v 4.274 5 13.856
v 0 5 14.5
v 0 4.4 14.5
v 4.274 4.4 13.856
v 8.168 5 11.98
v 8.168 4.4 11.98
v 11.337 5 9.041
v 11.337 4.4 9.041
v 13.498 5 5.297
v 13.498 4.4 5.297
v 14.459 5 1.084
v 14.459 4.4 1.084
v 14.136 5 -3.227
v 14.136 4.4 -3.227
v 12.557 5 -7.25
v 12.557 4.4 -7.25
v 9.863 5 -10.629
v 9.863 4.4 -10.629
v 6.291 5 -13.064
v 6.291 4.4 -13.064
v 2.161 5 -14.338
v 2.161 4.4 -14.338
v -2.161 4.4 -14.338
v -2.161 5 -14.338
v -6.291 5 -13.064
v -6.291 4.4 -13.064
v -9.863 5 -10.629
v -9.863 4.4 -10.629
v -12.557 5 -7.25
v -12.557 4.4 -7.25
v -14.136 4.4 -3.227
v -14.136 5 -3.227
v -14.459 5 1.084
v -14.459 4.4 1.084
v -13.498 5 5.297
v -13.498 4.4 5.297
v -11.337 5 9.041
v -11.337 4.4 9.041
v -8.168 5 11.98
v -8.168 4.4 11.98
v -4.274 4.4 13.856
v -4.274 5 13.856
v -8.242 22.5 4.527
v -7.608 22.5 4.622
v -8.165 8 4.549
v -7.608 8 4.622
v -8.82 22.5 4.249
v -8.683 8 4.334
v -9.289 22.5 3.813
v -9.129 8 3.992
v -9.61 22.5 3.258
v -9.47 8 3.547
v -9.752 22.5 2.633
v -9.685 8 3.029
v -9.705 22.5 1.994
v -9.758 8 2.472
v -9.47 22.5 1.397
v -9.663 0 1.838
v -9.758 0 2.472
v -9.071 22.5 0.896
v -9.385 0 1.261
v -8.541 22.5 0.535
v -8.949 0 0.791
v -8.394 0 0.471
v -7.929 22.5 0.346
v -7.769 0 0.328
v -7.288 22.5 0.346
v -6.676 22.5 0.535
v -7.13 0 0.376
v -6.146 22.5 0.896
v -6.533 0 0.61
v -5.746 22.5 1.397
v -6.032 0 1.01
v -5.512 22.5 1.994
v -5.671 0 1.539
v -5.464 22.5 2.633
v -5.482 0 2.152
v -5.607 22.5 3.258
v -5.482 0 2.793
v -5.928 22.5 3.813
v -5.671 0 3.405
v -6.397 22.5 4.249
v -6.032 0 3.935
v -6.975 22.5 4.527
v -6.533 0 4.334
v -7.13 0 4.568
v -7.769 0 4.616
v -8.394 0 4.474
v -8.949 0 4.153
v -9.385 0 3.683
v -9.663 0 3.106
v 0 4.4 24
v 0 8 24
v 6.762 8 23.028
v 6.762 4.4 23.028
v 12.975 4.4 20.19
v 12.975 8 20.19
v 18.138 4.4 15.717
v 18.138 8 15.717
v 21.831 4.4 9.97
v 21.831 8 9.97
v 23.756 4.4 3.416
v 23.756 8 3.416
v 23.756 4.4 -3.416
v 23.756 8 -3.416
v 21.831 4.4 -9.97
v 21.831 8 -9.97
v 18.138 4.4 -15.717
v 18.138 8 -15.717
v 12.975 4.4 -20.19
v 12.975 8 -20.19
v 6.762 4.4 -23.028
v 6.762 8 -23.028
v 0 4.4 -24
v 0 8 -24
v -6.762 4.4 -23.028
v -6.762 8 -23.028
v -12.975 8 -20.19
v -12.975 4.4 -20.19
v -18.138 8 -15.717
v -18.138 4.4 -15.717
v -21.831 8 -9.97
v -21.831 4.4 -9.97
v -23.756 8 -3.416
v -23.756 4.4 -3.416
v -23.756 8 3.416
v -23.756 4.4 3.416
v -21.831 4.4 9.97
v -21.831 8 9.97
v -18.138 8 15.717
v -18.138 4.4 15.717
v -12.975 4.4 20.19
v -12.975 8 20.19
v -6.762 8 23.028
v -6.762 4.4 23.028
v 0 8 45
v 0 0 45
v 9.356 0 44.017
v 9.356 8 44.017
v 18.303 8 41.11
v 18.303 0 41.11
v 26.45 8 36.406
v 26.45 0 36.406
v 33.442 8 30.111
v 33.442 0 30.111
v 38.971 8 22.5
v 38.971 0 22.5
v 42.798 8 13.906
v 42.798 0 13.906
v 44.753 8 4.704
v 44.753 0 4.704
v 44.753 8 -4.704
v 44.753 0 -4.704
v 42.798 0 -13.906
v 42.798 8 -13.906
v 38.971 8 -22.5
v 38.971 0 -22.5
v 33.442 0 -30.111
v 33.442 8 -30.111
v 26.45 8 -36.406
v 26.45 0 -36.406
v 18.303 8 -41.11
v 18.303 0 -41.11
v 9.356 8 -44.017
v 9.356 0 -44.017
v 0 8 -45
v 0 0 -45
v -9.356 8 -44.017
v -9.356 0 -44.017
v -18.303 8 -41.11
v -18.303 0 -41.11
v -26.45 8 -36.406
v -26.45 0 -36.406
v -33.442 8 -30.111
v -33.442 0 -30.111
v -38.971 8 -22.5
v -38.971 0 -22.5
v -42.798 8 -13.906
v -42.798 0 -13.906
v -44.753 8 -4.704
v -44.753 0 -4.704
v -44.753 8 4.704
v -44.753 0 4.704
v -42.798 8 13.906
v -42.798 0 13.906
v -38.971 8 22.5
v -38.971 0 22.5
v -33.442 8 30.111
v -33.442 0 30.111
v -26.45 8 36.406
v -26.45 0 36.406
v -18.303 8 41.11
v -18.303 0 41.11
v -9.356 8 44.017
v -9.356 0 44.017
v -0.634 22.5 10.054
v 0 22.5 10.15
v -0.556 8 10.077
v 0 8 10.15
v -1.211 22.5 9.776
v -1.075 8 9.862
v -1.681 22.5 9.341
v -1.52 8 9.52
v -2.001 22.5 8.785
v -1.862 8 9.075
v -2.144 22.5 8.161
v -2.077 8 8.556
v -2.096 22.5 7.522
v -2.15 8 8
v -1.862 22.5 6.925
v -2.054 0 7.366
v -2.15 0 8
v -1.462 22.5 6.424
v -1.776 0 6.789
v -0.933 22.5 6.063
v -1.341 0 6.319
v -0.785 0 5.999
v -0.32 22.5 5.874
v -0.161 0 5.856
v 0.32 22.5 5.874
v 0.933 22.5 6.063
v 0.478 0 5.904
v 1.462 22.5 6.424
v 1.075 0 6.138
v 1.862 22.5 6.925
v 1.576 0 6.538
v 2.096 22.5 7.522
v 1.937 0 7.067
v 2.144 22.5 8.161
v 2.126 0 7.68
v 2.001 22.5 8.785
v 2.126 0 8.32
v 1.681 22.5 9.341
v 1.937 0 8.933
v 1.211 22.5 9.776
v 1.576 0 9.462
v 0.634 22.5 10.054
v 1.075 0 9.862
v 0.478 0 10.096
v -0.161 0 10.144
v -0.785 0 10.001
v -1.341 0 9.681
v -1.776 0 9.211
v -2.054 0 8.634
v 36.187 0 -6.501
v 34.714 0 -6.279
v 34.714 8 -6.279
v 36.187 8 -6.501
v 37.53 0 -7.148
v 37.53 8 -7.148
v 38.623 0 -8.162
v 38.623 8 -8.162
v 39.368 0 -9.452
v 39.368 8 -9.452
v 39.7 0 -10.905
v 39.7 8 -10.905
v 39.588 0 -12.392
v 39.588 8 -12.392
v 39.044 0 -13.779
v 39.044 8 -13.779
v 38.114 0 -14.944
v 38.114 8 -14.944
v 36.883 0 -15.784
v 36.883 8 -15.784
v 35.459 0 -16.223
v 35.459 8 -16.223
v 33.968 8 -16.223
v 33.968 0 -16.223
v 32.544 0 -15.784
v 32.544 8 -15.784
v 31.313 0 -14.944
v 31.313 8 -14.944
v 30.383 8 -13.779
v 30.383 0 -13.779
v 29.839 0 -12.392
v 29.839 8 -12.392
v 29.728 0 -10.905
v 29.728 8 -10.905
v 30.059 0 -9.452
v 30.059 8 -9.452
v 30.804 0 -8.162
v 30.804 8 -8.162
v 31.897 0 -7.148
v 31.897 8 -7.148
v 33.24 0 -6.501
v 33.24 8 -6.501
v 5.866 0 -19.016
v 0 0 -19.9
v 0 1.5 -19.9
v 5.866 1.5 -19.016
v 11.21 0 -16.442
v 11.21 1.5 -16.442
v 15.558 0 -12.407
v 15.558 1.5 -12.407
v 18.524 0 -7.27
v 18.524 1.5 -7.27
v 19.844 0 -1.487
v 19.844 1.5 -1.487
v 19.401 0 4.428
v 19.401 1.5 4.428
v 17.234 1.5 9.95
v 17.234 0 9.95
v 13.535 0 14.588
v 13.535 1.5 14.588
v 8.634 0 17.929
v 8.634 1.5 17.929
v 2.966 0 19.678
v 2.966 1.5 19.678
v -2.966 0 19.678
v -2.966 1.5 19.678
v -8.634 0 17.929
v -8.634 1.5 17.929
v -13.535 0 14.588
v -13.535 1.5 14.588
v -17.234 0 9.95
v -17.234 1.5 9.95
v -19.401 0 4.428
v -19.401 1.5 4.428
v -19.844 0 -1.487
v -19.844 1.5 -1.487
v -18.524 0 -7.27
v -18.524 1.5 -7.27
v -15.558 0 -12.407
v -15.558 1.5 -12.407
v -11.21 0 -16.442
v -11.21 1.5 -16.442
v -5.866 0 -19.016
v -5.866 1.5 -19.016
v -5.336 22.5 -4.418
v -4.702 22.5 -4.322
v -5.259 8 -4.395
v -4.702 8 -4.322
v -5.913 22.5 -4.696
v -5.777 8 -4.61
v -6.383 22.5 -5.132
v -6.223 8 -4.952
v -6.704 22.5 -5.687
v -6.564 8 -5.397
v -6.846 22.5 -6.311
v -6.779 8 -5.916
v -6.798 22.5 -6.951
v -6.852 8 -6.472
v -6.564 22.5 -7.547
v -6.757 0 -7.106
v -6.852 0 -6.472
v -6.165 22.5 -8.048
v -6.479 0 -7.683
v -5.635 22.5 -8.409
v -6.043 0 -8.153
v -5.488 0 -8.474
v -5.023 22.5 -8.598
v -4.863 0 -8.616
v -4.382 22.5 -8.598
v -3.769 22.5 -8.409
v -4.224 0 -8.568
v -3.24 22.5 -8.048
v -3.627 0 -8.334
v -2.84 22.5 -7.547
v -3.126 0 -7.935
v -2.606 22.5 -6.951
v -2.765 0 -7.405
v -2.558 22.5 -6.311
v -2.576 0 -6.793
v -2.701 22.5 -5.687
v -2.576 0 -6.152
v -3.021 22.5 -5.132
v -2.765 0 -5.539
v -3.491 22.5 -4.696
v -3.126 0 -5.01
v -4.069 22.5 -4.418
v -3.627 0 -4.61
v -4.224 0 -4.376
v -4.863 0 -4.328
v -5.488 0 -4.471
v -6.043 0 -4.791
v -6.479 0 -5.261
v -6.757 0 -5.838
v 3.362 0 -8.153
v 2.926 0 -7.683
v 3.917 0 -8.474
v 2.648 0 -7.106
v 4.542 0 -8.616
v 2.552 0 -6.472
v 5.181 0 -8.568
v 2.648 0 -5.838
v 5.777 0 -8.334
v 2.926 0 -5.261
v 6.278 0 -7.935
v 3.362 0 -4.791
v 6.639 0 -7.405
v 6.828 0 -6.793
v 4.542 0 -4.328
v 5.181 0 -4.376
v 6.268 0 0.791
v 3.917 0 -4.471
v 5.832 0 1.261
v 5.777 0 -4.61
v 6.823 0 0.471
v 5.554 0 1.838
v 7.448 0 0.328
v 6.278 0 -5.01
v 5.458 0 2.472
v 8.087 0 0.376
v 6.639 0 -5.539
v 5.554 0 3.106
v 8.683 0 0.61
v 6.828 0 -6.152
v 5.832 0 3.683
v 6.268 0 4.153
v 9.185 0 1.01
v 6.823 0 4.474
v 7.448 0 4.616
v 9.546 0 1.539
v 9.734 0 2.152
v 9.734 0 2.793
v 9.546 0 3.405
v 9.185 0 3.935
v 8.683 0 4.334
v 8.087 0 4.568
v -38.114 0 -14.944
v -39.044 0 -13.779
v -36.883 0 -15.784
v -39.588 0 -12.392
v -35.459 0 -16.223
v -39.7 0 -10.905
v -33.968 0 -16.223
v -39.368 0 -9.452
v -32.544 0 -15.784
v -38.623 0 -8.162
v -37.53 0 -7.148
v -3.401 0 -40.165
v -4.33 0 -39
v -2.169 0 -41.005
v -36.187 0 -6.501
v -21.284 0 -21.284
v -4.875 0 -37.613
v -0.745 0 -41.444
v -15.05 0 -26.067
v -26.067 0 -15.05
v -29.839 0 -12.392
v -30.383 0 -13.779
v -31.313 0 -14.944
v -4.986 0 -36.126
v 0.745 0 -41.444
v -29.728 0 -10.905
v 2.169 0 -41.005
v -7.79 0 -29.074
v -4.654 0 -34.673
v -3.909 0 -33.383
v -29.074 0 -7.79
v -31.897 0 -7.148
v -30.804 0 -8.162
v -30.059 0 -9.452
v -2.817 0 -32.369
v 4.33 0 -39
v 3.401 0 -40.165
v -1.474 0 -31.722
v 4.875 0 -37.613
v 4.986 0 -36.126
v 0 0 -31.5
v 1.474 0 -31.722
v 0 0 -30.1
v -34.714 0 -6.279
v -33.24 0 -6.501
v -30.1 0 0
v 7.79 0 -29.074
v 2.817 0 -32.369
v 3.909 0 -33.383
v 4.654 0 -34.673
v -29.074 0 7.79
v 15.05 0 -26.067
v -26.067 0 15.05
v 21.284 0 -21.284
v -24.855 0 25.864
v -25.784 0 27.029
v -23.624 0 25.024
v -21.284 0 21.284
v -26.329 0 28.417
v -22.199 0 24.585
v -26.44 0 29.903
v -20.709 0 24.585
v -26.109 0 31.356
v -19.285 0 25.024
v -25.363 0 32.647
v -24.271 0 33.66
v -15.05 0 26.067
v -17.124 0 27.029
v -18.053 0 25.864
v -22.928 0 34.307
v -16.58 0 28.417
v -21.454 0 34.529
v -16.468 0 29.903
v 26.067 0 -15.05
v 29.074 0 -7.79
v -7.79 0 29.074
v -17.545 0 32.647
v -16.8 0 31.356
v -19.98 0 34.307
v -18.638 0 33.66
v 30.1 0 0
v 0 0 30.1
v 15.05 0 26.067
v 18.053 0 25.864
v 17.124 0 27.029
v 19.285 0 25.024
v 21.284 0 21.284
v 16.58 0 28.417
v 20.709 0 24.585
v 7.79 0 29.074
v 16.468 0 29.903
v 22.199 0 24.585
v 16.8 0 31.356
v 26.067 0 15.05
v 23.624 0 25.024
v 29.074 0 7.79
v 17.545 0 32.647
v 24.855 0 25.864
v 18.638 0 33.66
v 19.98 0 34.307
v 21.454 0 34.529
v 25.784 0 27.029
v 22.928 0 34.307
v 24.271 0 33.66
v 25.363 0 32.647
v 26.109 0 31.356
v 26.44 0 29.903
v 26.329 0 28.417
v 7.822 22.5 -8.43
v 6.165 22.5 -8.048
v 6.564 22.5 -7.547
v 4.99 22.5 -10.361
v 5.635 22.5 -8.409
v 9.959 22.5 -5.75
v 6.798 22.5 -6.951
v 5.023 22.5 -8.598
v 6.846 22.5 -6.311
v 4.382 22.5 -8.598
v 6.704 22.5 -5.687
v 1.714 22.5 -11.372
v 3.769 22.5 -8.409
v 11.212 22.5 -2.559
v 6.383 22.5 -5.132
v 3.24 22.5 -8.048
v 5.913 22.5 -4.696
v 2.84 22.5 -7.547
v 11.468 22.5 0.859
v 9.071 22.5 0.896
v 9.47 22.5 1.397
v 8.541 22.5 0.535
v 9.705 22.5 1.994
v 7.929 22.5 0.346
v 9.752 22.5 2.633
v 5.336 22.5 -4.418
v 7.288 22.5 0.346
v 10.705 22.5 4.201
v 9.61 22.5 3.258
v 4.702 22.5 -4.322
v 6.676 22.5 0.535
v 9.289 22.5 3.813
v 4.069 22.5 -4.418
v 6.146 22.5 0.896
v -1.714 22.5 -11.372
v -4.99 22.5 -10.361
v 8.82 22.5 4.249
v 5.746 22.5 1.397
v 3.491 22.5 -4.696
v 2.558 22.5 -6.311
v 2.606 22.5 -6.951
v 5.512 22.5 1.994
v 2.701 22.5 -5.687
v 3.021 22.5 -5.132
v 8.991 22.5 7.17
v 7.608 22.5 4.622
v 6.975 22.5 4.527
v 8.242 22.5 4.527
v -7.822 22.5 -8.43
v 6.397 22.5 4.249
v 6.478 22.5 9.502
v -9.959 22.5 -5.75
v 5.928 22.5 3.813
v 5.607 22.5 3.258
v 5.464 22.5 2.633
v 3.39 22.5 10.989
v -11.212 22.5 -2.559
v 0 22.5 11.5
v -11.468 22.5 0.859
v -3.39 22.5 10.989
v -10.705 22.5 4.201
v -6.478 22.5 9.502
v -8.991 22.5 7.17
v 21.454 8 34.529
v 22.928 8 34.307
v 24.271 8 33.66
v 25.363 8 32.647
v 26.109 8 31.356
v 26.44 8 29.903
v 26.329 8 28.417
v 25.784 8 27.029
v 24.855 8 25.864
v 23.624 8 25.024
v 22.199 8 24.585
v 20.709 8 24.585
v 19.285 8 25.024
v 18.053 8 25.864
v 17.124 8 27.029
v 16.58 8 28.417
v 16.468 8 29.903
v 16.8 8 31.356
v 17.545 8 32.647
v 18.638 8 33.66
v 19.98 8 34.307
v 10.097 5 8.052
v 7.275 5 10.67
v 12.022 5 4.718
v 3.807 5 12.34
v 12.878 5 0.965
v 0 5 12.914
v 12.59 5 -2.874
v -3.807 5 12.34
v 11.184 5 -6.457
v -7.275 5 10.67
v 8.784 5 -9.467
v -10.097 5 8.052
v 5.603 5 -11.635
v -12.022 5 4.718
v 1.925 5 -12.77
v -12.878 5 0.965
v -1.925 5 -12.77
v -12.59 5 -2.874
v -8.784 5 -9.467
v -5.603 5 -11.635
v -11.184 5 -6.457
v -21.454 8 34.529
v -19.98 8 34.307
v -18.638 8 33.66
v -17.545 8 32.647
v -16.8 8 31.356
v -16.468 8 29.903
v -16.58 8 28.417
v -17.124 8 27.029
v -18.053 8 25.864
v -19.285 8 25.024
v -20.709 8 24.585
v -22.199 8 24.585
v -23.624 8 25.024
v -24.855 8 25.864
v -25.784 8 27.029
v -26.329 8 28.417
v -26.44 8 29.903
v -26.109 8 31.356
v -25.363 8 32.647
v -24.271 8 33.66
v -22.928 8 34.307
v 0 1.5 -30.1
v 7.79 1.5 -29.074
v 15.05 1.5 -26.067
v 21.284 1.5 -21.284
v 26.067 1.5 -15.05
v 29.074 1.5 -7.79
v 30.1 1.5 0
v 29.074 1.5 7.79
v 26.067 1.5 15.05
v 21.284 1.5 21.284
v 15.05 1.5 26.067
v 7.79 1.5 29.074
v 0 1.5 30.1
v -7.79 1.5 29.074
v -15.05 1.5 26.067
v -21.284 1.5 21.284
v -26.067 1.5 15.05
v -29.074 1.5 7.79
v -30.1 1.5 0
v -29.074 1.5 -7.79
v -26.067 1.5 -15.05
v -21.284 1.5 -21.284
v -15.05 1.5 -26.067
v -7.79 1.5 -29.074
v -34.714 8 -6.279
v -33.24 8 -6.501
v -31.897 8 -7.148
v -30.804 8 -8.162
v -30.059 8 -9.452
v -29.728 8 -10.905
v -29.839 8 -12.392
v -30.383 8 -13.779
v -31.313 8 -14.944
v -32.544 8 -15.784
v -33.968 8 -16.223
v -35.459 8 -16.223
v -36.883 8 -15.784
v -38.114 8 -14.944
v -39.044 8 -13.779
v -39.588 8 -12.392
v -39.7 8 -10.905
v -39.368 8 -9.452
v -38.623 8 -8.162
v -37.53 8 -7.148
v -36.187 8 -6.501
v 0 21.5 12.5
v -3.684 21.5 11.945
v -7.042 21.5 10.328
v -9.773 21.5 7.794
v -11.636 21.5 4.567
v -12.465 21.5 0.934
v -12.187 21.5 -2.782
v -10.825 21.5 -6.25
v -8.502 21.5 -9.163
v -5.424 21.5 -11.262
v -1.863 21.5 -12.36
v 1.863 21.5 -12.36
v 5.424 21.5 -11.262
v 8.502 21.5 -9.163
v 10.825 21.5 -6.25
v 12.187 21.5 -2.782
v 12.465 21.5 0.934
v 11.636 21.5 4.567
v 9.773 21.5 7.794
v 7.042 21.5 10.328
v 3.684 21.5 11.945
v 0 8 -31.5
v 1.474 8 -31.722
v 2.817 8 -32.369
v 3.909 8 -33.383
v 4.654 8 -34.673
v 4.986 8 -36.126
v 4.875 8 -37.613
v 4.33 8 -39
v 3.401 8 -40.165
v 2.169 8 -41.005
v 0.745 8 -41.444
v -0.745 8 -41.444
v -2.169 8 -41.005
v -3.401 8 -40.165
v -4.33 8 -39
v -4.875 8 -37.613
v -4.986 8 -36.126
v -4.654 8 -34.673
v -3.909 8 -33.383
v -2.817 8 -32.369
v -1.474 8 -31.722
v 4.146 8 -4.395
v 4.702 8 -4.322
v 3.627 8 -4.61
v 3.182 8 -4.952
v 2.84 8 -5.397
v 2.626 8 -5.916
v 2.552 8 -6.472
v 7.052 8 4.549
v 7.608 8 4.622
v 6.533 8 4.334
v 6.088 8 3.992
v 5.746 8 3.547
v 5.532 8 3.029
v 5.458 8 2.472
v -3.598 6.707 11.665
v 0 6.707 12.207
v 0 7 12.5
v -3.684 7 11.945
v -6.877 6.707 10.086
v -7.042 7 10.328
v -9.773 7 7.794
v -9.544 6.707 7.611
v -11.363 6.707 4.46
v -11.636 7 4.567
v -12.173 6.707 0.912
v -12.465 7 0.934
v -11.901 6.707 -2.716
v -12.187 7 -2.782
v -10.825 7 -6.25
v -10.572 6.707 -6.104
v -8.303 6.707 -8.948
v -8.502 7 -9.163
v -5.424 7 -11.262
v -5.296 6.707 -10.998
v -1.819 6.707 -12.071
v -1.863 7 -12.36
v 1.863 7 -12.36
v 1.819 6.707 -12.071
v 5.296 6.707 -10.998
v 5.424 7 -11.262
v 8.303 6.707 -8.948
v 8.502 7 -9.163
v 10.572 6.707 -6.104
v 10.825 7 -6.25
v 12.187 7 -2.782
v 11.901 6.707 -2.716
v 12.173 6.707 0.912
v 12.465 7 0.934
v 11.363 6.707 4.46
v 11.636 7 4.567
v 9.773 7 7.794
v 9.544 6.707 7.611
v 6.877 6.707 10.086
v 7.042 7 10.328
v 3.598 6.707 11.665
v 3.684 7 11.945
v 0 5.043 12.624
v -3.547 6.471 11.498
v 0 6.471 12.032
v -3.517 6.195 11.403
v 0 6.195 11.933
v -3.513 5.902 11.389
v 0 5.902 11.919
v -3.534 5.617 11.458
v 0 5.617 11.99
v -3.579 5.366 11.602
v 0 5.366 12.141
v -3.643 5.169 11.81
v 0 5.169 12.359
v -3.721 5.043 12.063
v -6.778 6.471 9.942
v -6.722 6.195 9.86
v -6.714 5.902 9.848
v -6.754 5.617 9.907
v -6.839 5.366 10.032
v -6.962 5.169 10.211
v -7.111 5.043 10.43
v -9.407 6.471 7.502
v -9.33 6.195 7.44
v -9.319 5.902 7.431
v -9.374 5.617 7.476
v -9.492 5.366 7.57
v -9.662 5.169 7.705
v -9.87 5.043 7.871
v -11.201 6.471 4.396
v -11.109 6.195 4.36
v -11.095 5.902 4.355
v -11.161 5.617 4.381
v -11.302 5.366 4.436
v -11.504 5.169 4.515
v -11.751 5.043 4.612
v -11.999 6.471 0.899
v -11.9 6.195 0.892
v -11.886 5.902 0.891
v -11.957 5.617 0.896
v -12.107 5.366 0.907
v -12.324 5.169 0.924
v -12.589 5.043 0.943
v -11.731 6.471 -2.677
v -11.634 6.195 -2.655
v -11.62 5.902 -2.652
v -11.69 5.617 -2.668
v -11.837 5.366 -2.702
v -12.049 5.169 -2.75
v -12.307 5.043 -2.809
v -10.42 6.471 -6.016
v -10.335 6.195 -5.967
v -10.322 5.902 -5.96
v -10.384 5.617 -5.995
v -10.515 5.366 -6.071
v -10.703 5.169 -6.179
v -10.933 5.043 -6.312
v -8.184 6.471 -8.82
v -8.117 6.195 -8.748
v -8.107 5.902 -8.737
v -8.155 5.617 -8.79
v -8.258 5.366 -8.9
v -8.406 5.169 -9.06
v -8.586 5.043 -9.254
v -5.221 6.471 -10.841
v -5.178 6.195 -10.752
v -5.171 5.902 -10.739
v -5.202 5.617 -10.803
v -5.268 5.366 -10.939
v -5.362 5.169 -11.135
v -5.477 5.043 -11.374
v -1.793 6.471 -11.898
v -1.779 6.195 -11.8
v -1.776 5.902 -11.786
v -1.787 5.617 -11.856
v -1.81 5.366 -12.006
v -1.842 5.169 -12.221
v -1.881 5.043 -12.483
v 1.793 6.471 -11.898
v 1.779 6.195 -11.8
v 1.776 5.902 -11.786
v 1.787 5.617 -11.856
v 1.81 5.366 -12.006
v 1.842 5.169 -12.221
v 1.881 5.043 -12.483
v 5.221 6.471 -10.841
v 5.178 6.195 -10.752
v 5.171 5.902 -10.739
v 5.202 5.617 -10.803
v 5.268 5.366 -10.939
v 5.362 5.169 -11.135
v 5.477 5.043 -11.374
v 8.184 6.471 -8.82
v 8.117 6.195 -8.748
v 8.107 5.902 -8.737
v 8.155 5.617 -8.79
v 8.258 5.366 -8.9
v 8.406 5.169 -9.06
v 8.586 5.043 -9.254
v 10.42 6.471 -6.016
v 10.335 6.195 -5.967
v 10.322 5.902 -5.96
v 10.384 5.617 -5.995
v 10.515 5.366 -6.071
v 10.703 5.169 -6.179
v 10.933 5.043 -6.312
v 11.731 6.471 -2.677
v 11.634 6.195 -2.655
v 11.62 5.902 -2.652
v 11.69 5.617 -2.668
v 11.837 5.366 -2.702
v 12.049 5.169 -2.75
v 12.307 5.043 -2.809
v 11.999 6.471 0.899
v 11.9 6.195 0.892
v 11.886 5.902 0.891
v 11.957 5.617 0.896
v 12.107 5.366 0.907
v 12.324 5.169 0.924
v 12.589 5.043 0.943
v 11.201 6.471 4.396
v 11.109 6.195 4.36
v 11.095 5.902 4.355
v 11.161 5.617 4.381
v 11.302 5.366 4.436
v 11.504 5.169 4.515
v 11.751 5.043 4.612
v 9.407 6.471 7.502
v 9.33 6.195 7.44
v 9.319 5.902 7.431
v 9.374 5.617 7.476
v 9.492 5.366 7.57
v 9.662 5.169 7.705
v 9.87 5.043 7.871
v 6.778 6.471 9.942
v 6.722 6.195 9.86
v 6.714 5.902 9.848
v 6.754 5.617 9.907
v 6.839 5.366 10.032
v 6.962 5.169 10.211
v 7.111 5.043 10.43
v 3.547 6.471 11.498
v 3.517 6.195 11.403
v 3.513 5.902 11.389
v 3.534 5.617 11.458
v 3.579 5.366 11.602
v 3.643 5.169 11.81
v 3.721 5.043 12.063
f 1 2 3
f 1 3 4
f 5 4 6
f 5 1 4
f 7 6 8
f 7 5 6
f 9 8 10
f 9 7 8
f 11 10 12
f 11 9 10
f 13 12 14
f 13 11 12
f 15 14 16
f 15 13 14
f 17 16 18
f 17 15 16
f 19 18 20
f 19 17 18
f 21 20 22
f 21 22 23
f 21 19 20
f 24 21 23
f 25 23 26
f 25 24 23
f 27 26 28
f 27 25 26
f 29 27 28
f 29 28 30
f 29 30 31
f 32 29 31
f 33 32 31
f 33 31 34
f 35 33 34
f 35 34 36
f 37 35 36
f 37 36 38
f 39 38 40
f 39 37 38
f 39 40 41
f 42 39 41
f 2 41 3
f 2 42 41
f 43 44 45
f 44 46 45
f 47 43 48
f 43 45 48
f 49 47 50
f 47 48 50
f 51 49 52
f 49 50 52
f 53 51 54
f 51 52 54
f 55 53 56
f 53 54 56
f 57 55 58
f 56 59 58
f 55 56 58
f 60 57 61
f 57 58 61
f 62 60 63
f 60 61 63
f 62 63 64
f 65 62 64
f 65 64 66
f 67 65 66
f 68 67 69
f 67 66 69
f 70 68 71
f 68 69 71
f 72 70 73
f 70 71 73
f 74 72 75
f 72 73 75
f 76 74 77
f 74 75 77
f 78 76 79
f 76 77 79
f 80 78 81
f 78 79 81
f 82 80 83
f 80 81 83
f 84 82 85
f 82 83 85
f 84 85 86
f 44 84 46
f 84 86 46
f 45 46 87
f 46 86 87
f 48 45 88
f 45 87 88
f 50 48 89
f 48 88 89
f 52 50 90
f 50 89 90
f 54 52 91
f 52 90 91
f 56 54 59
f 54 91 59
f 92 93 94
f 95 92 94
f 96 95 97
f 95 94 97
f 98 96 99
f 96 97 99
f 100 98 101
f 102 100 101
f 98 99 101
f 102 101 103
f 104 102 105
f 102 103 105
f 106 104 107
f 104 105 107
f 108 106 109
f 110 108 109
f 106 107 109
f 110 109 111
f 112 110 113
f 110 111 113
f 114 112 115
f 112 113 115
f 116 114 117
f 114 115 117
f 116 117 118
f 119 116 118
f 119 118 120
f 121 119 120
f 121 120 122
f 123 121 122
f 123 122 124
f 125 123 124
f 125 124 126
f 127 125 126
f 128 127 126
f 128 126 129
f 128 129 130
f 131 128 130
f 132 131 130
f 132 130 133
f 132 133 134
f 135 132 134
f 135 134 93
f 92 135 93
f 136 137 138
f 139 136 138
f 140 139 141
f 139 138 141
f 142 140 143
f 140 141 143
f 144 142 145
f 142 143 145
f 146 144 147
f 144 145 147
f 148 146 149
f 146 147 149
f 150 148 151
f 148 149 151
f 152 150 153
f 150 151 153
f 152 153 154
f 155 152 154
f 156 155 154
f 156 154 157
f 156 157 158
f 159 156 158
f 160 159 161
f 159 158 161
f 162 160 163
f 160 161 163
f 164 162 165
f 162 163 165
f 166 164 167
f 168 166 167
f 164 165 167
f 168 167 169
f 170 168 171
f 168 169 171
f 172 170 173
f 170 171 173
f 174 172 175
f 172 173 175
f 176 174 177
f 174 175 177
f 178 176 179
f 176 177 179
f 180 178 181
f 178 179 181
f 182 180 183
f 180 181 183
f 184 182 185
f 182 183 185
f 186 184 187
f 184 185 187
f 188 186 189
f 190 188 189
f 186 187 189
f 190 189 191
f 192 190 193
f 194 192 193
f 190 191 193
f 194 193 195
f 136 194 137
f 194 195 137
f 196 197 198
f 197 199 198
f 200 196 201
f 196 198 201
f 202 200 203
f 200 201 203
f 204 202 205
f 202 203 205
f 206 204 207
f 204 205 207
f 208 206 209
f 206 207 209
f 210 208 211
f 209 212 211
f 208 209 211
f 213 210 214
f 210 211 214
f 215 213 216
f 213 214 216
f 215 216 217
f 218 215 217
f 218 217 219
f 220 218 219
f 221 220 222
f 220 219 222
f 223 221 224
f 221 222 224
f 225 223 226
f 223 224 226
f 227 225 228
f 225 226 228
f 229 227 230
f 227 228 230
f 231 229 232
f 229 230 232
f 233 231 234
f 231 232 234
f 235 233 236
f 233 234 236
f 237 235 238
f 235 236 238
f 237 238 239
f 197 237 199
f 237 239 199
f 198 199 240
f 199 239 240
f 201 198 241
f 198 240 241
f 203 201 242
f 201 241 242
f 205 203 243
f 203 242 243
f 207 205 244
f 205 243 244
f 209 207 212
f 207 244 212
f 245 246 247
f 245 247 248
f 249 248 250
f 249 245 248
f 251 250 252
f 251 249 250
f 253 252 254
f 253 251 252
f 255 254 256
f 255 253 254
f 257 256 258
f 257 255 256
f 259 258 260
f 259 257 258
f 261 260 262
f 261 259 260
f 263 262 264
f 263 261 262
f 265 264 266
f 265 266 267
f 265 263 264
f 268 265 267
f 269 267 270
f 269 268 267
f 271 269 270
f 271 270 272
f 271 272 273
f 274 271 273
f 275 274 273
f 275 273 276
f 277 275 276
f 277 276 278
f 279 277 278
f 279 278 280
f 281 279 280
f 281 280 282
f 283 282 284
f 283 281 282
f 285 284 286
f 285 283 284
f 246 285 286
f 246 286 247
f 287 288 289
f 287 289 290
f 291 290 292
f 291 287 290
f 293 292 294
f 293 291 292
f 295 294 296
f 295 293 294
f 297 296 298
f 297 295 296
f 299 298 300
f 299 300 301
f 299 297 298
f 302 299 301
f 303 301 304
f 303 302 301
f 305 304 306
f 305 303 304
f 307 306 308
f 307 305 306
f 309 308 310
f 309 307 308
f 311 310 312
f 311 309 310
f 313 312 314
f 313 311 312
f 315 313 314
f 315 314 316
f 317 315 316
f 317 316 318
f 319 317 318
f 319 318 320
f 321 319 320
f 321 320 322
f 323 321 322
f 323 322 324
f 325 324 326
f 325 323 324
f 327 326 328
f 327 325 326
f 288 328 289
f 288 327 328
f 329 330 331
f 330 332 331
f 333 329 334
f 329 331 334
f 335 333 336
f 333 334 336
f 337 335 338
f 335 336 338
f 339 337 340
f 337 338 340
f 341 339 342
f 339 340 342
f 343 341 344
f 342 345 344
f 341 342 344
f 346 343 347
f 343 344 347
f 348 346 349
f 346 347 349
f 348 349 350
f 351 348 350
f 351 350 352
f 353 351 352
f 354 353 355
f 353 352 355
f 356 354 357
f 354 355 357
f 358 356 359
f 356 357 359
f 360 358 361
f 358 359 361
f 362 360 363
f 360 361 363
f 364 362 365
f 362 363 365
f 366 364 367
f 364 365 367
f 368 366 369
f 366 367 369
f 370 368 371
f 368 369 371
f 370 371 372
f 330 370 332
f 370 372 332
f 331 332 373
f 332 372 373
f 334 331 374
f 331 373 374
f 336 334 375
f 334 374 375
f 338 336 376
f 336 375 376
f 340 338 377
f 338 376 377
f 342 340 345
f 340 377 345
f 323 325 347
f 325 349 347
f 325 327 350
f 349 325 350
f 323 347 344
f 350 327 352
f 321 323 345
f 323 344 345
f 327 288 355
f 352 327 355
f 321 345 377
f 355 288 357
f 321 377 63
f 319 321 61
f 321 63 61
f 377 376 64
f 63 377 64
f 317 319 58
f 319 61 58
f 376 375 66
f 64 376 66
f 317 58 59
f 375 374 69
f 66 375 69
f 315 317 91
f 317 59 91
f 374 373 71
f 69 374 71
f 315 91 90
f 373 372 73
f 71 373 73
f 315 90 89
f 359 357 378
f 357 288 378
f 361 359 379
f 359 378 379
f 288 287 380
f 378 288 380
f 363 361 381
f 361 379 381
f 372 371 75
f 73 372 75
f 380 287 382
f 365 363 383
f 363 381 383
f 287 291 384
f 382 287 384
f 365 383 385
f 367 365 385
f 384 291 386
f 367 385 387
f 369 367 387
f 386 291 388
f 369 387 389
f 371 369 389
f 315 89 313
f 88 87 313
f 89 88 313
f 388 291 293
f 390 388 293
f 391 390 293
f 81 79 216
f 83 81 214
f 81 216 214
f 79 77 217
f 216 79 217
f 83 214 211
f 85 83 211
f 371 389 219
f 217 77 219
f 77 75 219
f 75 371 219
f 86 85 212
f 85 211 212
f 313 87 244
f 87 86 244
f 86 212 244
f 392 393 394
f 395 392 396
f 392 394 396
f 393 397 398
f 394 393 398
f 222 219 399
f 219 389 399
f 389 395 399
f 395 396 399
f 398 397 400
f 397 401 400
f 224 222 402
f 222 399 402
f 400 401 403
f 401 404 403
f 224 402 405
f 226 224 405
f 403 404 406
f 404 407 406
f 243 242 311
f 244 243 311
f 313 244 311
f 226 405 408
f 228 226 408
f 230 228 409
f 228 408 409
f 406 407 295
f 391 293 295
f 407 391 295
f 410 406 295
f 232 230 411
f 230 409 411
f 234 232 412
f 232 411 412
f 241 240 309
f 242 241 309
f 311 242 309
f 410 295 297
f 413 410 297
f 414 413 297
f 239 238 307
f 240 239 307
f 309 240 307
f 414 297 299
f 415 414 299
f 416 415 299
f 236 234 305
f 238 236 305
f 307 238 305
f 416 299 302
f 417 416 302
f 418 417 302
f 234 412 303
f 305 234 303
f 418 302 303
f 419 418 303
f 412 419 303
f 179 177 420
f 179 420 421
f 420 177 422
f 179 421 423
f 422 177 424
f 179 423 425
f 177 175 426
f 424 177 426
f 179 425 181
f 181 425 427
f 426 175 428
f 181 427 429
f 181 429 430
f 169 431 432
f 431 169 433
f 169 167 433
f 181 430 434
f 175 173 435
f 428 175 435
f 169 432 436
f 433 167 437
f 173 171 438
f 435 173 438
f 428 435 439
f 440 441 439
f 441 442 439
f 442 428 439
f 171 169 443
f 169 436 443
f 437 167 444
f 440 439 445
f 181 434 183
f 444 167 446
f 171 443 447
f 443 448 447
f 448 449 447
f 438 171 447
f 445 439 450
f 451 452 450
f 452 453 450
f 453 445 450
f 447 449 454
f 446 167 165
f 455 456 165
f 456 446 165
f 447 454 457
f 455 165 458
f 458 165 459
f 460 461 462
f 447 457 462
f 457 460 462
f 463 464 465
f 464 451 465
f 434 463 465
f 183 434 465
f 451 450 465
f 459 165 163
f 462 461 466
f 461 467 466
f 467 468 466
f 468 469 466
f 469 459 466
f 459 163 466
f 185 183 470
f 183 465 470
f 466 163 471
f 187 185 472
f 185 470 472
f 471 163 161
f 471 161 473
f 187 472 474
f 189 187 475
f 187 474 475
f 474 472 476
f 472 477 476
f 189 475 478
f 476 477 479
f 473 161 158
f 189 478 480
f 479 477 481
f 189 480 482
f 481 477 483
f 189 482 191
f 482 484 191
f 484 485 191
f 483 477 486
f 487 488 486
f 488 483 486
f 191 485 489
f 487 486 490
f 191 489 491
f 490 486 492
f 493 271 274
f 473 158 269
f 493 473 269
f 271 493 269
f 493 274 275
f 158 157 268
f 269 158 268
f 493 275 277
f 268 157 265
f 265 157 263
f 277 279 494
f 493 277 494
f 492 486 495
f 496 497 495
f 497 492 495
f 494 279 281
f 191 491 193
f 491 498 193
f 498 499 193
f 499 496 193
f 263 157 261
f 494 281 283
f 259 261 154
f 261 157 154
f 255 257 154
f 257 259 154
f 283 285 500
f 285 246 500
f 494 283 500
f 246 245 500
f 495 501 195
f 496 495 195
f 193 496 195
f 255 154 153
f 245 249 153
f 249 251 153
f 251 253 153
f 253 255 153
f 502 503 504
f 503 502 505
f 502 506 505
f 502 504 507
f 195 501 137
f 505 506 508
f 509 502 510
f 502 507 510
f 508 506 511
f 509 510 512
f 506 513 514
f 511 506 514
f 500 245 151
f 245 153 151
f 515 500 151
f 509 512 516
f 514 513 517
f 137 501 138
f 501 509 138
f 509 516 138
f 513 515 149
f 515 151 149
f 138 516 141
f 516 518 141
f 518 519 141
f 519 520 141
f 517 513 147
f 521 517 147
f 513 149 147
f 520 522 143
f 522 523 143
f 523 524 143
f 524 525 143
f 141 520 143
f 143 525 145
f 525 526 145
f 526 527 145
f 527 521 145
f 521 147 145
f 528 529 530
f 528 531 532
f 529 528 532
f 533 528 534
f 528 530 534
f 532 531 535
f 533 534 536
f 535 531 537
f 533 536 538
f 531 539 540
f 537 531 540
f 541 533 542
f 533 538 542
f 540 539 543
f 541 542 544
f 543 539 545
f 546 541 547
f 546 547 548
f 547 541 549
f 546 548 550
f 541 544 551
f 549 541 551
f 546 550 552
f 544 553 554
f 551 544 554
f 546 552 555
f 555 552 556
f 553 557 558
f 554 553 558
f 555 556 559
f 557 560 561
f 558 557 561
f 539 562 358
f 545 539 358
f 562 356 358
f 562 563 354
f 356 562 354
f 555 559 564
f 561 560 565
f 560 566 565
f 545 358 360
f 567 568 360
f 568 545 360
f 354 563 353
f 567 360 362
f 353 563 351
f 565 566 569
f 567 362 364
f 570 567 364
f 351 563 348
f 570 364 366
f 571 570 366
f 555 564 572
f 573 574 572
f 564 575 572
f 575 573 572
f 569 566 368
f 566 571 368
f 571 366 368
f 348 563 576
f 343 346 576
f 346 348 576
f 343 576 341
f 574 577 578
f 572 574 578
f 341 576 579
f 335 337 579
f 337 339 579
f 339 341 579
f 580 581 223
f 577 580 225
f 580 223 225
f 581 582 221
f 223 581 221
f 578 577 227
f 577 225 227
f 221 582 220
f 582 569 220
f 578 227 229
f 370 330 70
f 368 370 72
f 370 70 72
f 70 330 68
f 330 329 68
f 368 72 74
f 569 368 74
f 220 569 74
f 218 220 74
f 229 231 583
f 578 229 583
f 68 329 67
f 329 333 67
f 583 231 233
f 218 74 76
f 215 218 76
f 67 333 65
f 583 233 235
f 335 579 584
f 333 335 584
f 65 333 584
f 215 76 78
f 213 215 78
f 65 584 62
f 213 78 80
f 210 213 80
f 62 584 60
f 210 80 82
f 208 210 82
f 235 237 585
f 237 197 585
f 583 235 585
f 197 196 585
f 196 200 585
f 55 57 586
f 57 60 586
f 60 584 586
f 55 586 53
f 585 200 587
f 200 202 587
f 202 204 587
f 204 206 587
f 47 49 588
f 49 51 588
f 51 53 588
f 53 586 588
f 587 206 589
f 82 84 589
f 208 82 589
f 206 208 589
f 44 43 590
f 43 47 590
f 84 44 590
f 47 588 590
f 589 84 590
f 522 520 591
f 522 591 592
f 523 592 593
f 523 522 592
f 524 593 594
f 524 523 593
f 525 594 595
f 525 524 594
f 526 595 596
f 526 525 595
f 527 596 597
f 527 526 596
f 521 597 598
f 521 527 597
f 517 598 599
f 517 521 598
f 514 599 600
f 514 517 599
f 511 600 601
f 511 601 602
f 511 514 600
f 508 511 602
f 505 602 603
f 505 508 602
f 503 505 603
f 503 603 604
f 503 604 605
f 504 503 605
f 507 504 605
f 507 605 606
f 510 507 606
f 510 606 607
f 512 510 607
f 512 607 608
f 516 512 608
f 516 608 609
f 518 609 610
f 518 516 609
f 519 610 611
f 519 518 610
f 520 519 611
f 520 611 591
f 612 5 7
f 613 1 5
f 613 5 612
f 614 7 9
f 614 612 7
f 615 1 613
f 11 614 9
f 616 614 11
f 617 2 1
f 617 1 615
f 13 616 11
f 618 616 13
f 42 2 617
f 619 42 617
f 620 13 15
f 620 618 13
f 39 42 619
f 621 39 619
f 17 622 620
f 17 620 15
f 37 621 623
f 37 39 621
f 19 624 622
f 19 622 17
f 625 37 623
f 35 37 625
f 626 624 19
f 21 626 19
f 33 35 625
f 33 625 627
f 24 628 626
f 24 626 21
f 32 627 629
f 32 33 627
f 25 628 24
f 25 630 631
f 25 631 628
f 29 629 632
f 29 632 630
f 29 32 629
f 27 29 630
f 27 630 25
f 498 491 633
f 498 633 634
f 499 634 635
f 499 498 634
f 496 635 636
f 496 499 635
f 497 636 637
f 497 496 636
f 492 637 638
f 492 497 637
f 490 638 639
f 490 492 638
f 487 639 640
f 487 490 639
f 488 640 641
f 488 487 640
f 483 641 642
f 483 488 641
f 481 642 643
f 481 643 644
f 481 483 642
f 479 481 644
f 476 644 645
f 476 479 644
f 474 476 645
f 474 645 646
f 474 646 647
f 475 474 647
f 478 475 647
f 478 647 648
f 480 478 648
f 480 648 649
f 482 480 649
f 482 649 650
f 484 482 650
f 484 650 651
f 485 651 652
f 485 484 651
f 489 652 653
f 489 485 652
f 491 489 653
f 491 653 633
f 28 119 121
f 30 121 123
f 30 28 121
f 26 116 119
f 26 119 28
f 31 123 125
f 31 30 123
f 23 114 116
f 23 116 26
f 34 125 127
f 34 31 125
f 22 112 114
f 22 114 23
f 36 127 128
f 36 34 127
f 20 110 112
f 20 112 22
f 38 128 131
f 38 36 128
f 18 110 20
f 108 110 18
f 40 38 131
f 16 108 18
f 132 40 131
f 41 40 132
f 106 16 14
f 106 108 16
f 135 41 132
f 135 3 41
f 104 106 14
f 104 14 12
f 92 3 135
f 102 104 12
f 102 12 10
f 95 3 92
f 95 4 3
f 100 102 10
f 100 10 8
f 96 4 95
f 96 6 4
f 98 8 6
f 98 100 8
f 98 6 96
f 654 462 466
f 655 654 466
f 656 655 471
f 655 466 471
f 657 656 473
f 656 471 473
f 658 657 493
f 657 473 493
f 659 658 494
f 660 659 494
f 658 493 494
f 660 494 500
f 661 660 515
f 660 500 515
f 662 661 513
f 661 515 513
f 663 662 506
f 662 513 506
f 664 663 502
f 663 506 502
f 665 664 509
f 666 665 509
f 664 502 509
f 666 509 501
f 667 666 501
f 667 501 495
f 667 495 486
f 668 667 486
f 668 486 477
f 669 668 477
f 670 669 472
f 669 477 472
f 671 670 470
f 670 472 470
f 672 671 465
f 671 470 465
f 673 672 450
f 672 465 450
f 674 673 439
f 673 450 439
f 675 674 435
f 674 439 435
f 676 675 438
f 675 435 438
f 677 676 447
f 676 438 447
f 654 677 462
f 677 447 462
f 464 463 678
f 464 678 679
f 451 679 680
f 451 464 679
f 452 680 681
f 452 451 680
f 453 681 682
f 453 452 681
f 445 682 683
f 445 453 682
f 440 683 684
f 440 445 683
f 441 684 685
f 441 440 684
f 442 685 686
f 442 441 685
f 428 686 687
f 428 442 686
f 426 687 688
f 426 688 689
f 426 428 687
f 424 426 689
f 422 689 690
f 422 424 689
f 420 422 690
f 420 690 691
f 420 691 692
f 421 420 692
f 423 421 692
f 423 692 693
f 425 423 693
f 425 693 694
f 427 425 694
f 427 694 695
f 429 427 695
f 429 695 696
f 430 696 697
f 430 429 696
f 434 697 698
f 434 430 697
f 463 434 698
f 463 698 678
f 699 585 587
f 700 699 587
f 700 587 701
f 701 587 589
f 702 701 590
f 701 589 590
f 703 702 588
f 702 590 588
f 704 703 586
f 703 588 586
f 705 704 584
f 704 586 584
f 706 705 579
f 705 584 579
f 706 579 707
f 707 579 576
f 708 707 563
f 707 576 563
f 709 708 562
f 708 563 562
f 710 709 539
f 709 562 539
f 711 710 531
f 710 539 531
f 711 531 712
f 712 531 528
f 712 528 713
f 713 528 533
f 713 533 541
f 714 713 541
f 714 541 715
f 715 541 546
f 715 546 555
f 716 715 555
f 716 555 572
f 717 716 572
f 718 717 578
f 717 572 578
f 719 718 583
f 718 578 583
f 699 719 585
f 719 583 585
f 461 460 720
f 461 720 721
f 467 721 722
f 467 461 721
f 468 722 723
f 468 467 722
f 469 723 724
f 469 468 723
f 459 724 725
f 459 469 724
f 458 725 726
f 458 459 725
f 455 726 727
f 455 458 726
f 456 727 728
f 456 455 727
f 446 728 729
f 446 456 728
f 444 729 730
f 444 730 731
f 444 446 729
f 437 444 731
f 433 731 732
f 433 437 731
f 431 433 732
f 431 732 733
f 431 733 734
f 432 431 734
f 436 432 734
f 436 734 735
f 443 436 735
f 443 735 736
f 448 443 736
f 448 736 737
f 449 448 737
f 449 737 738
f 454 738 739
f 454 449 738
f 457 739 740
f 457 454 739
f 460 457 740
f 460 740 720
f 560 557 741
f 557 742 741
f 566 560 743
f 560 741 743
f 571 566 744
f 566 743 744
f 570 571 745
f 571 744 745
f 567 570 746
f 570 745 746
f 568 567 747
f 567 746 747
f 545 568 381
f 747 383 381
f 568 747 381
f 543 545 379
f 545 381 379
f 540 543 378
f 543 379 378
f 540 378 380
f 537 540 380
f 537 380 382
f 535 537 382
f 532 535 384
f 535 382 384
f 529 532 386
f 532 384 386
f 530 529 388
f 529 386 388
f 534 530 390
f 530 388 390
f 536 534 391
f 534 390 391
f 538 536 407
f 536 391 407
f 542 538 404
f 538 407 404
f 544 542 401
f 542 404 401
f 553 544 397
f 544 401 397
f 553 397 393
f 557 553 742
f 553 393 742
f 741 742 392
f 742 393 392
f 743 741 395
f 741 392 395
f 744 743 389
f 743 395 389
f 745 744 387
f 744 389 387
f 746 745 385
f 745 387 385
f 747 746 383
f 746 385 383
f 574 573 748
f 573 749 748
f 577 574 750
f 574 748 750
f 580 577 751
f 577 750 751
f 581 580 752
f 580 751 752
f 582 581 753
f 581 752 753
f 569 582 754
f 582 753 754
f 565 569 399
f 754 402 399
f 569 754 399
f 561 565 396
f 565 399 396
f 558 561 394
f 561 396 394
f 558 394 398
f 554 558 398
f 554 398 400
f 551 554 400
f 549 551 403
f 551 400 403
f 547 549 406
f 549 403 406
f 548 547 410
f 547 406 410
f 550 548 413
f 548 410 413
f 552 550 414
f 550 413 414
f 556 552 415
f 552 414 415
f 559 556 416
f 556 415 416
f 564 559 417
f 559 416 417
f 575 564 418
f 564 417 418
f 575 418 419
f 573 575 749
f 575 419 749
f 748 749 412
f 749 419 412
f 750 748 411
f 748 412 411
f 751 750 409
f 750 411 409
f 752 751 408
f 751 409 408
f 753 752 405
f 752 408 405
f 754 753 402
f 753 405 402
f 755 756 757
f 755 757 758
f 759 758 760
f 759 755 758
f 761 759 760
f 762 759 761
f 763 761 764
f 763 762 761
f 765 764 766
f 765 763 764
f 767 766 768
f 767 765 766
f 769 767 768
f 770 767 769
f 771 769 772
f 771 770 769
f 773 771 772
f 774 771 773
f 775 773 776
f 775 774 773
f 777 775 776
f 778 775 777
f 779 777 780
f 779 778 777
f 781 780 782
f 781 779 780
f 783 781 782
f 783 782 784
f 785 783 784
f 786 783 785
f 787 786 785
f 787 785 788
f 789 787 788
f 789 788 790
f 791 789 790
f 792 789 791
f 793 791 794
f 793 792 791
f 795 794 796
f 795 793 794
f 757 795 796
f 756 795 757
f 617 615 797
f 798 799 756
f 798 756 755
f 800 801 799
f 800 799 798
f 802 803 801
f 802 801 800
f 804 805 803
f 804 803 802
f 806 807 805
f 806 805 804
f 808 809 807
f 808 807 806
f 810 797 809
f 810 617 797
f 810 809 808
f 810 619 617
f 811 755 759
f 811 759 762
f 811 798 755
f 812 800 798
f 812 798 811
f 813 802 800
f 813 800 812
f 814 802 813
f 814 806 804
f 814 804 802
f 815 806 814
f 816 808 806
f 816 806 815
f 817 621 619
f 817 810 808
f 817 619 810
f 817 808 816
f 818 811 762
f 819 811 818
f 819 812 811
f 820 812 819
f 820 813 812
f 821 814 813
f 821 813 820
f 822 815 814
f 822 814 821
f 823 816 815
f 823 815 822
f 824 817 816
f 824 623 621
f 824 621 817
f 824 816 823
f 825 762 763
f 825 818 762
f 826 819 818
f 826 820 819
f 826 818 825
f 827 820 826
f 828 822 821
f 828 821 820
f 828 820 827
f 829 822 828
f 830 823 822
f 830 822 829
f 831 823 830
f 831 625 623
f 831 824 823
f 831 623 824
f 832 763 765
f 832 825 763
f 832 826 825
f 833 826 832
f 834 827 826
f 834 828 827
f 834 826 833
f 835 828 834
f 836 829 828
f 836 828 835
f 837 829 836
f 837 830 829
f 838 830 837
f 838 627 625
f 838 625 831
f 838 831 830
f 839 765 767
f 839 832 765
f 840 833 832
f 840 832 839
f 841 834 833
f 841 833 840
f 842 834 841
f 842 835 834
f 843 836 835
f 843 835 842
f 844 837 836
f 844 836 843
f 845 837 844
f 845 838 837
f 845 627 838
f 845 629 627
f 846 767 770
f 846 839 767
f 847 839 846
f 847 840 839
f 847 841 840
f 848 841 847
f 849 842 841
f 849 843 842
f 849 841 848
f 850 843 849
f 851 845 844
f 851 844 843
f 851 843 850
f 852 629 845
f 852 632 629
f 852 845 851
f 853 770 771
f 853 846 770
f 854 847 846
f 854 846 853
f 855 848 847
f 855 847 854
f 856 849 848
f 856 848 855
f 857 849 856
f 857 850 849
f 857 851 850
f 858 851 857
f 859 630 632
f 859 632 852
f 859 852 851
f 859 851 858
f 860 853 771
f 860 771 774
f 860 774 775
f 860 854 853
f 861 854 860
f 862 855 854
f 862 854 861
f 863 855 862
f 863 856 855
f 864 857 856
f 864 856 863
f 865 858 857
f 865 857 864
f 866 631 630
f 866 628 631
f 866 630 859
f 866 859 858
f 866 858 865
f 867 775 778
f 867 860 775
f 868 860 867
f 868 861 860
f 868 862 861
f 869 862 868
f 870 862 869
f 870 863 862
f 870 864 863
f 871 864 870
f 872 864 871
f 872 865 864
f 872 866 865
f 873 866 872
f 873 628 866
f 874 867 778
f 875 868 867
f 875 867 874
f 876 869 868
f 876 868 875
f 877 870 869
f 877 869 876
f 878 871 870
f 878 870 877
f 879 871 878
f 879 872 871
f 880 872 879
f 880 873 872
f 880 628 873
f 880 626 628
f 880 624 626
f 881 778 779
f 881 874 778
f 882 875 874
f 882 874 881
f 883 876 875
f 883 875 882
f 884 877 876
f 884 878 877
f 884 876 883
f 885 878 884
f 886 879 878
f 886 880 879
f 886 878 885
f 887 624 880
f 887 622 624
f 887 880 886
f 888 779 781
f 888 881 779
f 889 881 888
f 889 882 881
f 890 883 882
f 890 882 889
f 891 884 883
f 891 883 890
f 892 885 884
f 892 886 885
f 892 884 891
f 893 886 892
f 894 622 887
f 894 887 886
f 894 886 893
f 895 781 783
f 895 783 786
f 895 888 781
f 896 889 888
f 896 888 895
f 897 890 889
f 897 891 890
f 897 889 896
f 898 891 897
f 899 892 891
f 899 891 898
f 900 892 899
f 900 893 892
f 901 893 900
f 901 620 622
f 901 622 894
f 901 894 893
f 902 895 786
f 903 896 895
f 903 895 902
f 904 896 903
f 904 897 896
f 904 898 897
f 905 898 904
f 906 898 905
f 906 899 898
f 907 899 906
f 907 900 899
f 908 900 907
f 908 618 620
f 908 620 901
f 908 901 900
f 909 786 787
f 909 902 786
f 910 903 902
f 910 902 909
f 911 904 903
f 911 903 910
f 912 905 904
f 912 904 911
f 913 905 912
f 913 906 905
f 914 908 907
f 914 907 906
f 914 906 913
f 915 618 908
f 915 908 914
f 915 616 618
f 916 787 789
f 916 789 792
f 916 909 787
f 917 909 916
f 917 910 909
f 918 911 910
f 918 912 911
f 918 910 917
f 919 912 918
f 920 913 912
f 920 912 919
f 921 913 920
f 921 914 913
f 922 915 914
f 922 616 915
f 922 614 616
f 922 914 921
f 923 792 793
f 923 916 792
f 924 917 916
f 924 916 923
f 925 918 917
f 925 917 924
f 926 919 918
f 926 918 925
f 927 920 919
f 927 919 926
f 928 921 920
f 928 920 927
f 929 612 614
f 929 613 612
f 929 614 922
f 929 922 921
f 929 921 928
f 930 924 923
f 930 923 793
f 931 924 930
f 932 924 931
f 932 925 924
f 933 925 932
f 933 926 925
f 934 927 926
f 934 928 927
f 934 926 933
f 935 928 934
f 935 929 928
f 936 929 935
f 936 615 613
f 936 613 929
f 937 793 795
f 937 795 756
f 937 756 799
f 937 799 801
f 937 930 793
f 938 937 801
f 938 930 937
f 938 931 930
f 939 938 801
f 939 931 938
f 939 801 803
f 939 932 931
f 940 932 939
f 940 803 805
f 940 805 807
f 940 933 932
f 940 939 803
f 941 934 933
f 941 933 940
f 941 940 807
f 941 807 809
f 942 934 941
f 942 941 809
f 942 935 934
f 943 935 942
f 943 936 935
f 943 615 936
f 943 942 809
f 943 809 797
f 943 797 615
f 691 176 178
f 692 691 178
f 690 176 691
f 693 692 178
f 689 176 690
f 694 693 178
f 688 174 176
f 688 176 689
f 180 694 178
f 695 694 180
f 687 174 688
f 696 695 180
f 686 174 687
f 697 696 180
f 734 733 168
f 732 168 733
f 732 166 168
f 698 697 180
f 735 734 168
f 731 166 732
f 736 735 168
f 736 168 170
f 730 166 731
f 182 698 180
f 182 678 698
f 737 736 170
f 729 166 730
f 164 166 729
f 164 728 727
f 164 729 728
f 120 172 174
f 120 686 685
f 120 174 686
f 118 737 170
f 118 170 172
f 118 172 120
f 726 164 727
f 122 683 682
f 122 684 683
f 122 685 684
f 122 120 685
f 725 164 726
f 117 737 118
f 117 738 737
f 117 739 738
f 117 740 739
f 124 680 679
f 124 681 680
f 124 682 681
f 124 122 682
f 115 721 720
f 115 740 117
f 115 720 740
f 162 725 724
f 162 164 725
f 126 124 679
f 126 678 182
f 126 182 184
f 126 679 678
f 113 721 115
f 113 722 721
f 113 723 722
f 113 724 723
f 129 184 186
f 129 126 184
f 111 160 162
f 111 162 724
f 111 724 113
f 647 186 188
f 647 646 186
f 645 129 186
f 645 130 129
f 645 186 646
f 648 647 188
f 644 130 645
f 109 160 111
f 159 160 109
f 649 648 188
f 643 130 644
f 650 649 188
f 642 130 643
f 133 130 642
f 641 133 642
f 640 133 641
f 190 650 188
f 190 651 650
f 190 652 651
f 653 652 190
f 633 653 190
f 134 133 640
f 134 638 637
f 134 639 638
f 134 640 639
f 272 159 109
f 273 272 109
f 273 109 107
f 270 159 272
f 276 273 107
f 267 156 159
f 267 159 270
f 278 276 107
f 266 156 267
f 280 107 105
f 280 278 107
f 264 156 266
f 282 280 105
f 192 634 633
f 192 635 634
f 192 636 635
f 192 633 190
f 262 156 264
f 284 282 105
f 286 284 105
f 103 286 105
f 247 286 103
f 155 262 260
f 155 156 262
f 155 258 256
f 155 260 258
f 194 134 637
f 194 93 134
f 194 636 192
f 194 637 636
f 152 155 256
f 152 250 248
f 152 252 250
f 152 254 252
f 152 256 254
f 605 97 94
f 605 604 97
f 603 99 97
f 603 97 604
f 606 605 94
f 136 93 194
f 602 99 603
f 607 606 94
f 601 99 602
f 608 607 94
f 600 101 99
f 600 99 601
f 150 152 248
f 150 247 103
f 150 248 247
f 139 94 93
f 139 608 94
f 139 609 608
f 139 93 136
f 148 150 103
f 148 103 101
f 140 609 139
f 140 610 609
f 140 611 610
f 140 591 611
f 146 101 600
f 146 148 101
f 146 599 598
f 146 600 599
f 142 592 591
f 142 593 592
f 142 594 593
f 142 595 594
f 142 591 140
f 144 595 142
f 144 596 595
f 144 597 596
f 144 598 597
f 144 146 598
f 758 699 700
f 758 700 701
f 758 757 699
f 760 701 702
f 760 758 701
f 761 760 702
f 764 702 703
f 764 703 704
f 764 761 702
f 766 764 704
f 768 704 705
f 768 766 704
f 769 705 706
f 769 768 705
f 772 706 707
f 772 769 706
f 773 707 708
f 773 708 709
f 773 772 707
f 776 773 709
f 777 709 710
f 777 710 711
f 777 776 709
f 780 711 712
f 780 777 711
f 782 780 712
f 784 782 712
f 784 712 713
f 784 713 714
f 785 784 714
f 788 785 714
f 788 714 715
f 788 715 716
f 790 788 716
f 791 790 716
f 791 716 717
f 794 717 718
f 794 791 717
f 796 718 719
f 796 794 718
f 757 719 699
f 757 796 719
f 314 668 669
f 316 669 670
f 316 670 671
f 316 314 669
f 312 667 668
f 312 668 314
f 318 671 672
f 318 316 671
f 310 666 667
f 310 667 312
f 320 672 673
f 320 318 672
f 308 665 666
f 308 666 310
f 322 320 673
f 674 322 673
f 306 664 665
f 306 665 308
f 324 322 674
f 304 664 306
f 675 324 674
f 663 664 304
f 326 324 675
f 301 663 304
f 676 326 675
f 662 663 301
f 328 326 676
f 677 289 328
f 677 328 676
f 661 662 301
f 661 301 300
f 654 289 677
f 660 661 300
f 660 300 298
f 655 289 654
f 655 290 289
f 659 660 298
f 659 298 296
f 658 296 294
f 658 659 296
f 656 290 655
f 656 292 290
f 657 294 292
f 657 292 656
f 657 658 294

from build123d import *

# Parameters (mm, degrees)
SKETCH1_R                  = 45
SKETCH1_R_2                = 5
BOSS_EXTRUDE1_DEPTH        = 8
F_4_3_4_3_DIAMETER_HOLE1_D = 4.3
SKETCH6_R                  = 30.1
SKETCH6_R_2                = 19.9
CUT_EXTRUDE2_DEPTH         = 1.5
SKETCH8_R                  = 24
SKETCH8_R_2                = 12.5
CUT_EXTRUDE3_DEPTH         = 3
SKETCH9_R                  = 24
SKETCH9_R_2                = 14.5
CUT_EXTRUDE4_DEPTH         = 0.6
SKETCH10_R                 = 12.5
SKETCH10_R_2               = 2.15
BOSS_EXTRUDE2_DEPTH        = 14.5
CHAMFER1_SIZE              = 1
FILLET1_R                  = 1


with BuildPart() as part:
    # Sketch1 → Boss-Extrude1 (new body)
    with BuildSketch(Plane(origin=(0, 0, 0), x_dir=(1, 0, 0), z_dir=(0, 1, 0))):
        with Locations(Location((0, 0, 0), (0, 0, 270))):
            Circle(SKETCH1_R)
        with Locations(Location((0, 36.5, 0), (0, 0, 270))):
            Circle(SKETCH1_R_2, mode=Mode.SUBTRACT)
        with Locations(Location((34.713562845, 11.279120295, 0), (0, 0, 270))):
            Circle(SKETCH1_R_2, mode=Mode.SUBTRACT)
        with Locations(Location((21.454161709, -29.529120295, 0), (0, 0, 270))):
            Circle(SKETCH1_R_2, mode=Mode.SUBTRACT)
        with Locations(Location((-21.454161709, -29.529120295, 0), (0, 0, 270))):
            Circle(SKETCH1_R_2, mode=Mode.SUBTRACT)
        with Locations(Location((-34.713562845, 11.279120295, 0), (0, 0, 270))):
            Circle(SKETCH1_R_2, mode=Mode.SUBTRACT)
    extrude(amount=BOSS_EXTRUDE1_DEPTH)

    # Ø4.3 (4.3) Diameter Hole1 (through all)
    with Locations(Plane(origin=(0, 8, 0), x_dir=(1, 0, 0), z_dir=(0, 1, 0))):
        with Locations((-7.60845213, -2.472135955), (-4.702282018, 6.472135955), (4.702282018, 6.472135955), (7.60845213, -2.472135955), (0, -8)):
            Hole(F_4_3_4_3_DIAMETER_HOLE1_D / 2)

    # Sketch6 → Cut-Extrude2 (cut)
    with BuildSketch(Plane.XZ):
        with Locations(Location((0, 0, 0), (0, 0, 270))):
            Circle(SKETCH6_R)
        with Locations(Location((0, 0, 0), (0, 0, 270))):
            Circle(SKETCH6_R_2, mode=Mode.SUBTRACT)
    extrude(amount=-CUT_EXTRUDE2_DEPTH, mode=Mode.SUBTRACT)

    # Sketch8 → Cut-Extrude3 (cut)
    with BuildSketch(Plane(origin=(0, 8, 0), x_dir=(1, 0, 0), z_dir=(0, 1, 0))):
        with Locations(Location((0, 0, 0), (0, 0, 270))):
            Circle(SKETCH8_R)
        with Locations(Location((0, 0, 0), (0, 0, 270))):
            Circle(SKETCH8_R_2, mode=Mode.SUBTRACT)
    extrude(amount=-CUT_EXTRUDE3_DEPTH, mode=Mode.SUBTRACT)

    # Sketch9 → Cut-Extrude4 (cut)
    with BuildSketch(Plane(origin=(0, 5, 0), x_dir=(1, 0, 0), z_dir=(0, 1, 0))):
        with Locations(Location((0, 0, 0), (0, 0, 270))):
            Circle(SKETCH9_R)
        with Locations(Location((0, 0, 0), (0, 0, 270))):
            Circle(SKETCH9_R_2, mode=Mode.SUBTRACT)
    extrude(amount=-CUT_EXTRUDE4_DEPTH, mode=Mode.SUBTRACT)

    # Sketch10 → Boss-Extrude2 (add)
    with BuildSketch(Plane.XZ.offset(-8)):
        with Locations(Location((0, 0, 0), (0, 0, 90))):
            Circle(SKETCH10_R)
        with Locations(Location((7.60845213, 2.472135955, 0), (0, 0, 90))):
            Circle(SKETCH10_R_2, mode=Mode.SUBTRACT)
        with Locations(Location((4.702282018, -6.472135955, 0), (0, 0, 90))):
            Circle(SKETCH10_R_2, mode=Mode.SUBTRACT)
        with Locations(Location((-4.702282018, -6.472135955, 0), (0, 0, 90))):
            Circle(SKETCH10_R_2, mode=Mode.SUBTRACT)
        with Locations(Location((-7.60845213, 2.472135955, 0), (0, 0, 90))):
            Circle(SKETCH10_R_2, mode=Mode.SUBTRACT)
        with Locations(Location((0, 8, 0), (0, 0, 90))):
            Circle(SKETCH10_R_2, mode=Mode.SUBTRACT)
    extrude(amount=-BOSS_EXTRUDE2_DEPTH)

    # Chamfer1
    chamfer1_edges = [part.edges().sort_by_distance(p)[0] for p in [
        (0, 22.5, -12.5),
    ]]
    chamfer(chamfer1_edges, length=CHAMFER1_SIZE)

    # Sketch11 → Cut-Revolve1 (revolve, cut)
    with BuildSketch(Plane.XY, mode=Mode.PRIVATE) as cut_revolve1_sk:
        Polygon((12.5, 5), (12.5, 7), (10.5, 5), align=None)
    revolve(cut_revolve1_sk.sketch.rotate(Axis((0, 1.5, 0), (0, -1, 0)), 90), axis=Axis((0, 1.5, 0), (0, -1, 0)), mode=Mode.SUBTRACT)

    # Fillet1
    fillet1_edges = [part.edges().sort_by_distance(p)[0] for p in [
        (0, 5, -10.5),
    ]]
    fillet(fillet1_edges, radius=FILLET1_R)


solid = part.part
